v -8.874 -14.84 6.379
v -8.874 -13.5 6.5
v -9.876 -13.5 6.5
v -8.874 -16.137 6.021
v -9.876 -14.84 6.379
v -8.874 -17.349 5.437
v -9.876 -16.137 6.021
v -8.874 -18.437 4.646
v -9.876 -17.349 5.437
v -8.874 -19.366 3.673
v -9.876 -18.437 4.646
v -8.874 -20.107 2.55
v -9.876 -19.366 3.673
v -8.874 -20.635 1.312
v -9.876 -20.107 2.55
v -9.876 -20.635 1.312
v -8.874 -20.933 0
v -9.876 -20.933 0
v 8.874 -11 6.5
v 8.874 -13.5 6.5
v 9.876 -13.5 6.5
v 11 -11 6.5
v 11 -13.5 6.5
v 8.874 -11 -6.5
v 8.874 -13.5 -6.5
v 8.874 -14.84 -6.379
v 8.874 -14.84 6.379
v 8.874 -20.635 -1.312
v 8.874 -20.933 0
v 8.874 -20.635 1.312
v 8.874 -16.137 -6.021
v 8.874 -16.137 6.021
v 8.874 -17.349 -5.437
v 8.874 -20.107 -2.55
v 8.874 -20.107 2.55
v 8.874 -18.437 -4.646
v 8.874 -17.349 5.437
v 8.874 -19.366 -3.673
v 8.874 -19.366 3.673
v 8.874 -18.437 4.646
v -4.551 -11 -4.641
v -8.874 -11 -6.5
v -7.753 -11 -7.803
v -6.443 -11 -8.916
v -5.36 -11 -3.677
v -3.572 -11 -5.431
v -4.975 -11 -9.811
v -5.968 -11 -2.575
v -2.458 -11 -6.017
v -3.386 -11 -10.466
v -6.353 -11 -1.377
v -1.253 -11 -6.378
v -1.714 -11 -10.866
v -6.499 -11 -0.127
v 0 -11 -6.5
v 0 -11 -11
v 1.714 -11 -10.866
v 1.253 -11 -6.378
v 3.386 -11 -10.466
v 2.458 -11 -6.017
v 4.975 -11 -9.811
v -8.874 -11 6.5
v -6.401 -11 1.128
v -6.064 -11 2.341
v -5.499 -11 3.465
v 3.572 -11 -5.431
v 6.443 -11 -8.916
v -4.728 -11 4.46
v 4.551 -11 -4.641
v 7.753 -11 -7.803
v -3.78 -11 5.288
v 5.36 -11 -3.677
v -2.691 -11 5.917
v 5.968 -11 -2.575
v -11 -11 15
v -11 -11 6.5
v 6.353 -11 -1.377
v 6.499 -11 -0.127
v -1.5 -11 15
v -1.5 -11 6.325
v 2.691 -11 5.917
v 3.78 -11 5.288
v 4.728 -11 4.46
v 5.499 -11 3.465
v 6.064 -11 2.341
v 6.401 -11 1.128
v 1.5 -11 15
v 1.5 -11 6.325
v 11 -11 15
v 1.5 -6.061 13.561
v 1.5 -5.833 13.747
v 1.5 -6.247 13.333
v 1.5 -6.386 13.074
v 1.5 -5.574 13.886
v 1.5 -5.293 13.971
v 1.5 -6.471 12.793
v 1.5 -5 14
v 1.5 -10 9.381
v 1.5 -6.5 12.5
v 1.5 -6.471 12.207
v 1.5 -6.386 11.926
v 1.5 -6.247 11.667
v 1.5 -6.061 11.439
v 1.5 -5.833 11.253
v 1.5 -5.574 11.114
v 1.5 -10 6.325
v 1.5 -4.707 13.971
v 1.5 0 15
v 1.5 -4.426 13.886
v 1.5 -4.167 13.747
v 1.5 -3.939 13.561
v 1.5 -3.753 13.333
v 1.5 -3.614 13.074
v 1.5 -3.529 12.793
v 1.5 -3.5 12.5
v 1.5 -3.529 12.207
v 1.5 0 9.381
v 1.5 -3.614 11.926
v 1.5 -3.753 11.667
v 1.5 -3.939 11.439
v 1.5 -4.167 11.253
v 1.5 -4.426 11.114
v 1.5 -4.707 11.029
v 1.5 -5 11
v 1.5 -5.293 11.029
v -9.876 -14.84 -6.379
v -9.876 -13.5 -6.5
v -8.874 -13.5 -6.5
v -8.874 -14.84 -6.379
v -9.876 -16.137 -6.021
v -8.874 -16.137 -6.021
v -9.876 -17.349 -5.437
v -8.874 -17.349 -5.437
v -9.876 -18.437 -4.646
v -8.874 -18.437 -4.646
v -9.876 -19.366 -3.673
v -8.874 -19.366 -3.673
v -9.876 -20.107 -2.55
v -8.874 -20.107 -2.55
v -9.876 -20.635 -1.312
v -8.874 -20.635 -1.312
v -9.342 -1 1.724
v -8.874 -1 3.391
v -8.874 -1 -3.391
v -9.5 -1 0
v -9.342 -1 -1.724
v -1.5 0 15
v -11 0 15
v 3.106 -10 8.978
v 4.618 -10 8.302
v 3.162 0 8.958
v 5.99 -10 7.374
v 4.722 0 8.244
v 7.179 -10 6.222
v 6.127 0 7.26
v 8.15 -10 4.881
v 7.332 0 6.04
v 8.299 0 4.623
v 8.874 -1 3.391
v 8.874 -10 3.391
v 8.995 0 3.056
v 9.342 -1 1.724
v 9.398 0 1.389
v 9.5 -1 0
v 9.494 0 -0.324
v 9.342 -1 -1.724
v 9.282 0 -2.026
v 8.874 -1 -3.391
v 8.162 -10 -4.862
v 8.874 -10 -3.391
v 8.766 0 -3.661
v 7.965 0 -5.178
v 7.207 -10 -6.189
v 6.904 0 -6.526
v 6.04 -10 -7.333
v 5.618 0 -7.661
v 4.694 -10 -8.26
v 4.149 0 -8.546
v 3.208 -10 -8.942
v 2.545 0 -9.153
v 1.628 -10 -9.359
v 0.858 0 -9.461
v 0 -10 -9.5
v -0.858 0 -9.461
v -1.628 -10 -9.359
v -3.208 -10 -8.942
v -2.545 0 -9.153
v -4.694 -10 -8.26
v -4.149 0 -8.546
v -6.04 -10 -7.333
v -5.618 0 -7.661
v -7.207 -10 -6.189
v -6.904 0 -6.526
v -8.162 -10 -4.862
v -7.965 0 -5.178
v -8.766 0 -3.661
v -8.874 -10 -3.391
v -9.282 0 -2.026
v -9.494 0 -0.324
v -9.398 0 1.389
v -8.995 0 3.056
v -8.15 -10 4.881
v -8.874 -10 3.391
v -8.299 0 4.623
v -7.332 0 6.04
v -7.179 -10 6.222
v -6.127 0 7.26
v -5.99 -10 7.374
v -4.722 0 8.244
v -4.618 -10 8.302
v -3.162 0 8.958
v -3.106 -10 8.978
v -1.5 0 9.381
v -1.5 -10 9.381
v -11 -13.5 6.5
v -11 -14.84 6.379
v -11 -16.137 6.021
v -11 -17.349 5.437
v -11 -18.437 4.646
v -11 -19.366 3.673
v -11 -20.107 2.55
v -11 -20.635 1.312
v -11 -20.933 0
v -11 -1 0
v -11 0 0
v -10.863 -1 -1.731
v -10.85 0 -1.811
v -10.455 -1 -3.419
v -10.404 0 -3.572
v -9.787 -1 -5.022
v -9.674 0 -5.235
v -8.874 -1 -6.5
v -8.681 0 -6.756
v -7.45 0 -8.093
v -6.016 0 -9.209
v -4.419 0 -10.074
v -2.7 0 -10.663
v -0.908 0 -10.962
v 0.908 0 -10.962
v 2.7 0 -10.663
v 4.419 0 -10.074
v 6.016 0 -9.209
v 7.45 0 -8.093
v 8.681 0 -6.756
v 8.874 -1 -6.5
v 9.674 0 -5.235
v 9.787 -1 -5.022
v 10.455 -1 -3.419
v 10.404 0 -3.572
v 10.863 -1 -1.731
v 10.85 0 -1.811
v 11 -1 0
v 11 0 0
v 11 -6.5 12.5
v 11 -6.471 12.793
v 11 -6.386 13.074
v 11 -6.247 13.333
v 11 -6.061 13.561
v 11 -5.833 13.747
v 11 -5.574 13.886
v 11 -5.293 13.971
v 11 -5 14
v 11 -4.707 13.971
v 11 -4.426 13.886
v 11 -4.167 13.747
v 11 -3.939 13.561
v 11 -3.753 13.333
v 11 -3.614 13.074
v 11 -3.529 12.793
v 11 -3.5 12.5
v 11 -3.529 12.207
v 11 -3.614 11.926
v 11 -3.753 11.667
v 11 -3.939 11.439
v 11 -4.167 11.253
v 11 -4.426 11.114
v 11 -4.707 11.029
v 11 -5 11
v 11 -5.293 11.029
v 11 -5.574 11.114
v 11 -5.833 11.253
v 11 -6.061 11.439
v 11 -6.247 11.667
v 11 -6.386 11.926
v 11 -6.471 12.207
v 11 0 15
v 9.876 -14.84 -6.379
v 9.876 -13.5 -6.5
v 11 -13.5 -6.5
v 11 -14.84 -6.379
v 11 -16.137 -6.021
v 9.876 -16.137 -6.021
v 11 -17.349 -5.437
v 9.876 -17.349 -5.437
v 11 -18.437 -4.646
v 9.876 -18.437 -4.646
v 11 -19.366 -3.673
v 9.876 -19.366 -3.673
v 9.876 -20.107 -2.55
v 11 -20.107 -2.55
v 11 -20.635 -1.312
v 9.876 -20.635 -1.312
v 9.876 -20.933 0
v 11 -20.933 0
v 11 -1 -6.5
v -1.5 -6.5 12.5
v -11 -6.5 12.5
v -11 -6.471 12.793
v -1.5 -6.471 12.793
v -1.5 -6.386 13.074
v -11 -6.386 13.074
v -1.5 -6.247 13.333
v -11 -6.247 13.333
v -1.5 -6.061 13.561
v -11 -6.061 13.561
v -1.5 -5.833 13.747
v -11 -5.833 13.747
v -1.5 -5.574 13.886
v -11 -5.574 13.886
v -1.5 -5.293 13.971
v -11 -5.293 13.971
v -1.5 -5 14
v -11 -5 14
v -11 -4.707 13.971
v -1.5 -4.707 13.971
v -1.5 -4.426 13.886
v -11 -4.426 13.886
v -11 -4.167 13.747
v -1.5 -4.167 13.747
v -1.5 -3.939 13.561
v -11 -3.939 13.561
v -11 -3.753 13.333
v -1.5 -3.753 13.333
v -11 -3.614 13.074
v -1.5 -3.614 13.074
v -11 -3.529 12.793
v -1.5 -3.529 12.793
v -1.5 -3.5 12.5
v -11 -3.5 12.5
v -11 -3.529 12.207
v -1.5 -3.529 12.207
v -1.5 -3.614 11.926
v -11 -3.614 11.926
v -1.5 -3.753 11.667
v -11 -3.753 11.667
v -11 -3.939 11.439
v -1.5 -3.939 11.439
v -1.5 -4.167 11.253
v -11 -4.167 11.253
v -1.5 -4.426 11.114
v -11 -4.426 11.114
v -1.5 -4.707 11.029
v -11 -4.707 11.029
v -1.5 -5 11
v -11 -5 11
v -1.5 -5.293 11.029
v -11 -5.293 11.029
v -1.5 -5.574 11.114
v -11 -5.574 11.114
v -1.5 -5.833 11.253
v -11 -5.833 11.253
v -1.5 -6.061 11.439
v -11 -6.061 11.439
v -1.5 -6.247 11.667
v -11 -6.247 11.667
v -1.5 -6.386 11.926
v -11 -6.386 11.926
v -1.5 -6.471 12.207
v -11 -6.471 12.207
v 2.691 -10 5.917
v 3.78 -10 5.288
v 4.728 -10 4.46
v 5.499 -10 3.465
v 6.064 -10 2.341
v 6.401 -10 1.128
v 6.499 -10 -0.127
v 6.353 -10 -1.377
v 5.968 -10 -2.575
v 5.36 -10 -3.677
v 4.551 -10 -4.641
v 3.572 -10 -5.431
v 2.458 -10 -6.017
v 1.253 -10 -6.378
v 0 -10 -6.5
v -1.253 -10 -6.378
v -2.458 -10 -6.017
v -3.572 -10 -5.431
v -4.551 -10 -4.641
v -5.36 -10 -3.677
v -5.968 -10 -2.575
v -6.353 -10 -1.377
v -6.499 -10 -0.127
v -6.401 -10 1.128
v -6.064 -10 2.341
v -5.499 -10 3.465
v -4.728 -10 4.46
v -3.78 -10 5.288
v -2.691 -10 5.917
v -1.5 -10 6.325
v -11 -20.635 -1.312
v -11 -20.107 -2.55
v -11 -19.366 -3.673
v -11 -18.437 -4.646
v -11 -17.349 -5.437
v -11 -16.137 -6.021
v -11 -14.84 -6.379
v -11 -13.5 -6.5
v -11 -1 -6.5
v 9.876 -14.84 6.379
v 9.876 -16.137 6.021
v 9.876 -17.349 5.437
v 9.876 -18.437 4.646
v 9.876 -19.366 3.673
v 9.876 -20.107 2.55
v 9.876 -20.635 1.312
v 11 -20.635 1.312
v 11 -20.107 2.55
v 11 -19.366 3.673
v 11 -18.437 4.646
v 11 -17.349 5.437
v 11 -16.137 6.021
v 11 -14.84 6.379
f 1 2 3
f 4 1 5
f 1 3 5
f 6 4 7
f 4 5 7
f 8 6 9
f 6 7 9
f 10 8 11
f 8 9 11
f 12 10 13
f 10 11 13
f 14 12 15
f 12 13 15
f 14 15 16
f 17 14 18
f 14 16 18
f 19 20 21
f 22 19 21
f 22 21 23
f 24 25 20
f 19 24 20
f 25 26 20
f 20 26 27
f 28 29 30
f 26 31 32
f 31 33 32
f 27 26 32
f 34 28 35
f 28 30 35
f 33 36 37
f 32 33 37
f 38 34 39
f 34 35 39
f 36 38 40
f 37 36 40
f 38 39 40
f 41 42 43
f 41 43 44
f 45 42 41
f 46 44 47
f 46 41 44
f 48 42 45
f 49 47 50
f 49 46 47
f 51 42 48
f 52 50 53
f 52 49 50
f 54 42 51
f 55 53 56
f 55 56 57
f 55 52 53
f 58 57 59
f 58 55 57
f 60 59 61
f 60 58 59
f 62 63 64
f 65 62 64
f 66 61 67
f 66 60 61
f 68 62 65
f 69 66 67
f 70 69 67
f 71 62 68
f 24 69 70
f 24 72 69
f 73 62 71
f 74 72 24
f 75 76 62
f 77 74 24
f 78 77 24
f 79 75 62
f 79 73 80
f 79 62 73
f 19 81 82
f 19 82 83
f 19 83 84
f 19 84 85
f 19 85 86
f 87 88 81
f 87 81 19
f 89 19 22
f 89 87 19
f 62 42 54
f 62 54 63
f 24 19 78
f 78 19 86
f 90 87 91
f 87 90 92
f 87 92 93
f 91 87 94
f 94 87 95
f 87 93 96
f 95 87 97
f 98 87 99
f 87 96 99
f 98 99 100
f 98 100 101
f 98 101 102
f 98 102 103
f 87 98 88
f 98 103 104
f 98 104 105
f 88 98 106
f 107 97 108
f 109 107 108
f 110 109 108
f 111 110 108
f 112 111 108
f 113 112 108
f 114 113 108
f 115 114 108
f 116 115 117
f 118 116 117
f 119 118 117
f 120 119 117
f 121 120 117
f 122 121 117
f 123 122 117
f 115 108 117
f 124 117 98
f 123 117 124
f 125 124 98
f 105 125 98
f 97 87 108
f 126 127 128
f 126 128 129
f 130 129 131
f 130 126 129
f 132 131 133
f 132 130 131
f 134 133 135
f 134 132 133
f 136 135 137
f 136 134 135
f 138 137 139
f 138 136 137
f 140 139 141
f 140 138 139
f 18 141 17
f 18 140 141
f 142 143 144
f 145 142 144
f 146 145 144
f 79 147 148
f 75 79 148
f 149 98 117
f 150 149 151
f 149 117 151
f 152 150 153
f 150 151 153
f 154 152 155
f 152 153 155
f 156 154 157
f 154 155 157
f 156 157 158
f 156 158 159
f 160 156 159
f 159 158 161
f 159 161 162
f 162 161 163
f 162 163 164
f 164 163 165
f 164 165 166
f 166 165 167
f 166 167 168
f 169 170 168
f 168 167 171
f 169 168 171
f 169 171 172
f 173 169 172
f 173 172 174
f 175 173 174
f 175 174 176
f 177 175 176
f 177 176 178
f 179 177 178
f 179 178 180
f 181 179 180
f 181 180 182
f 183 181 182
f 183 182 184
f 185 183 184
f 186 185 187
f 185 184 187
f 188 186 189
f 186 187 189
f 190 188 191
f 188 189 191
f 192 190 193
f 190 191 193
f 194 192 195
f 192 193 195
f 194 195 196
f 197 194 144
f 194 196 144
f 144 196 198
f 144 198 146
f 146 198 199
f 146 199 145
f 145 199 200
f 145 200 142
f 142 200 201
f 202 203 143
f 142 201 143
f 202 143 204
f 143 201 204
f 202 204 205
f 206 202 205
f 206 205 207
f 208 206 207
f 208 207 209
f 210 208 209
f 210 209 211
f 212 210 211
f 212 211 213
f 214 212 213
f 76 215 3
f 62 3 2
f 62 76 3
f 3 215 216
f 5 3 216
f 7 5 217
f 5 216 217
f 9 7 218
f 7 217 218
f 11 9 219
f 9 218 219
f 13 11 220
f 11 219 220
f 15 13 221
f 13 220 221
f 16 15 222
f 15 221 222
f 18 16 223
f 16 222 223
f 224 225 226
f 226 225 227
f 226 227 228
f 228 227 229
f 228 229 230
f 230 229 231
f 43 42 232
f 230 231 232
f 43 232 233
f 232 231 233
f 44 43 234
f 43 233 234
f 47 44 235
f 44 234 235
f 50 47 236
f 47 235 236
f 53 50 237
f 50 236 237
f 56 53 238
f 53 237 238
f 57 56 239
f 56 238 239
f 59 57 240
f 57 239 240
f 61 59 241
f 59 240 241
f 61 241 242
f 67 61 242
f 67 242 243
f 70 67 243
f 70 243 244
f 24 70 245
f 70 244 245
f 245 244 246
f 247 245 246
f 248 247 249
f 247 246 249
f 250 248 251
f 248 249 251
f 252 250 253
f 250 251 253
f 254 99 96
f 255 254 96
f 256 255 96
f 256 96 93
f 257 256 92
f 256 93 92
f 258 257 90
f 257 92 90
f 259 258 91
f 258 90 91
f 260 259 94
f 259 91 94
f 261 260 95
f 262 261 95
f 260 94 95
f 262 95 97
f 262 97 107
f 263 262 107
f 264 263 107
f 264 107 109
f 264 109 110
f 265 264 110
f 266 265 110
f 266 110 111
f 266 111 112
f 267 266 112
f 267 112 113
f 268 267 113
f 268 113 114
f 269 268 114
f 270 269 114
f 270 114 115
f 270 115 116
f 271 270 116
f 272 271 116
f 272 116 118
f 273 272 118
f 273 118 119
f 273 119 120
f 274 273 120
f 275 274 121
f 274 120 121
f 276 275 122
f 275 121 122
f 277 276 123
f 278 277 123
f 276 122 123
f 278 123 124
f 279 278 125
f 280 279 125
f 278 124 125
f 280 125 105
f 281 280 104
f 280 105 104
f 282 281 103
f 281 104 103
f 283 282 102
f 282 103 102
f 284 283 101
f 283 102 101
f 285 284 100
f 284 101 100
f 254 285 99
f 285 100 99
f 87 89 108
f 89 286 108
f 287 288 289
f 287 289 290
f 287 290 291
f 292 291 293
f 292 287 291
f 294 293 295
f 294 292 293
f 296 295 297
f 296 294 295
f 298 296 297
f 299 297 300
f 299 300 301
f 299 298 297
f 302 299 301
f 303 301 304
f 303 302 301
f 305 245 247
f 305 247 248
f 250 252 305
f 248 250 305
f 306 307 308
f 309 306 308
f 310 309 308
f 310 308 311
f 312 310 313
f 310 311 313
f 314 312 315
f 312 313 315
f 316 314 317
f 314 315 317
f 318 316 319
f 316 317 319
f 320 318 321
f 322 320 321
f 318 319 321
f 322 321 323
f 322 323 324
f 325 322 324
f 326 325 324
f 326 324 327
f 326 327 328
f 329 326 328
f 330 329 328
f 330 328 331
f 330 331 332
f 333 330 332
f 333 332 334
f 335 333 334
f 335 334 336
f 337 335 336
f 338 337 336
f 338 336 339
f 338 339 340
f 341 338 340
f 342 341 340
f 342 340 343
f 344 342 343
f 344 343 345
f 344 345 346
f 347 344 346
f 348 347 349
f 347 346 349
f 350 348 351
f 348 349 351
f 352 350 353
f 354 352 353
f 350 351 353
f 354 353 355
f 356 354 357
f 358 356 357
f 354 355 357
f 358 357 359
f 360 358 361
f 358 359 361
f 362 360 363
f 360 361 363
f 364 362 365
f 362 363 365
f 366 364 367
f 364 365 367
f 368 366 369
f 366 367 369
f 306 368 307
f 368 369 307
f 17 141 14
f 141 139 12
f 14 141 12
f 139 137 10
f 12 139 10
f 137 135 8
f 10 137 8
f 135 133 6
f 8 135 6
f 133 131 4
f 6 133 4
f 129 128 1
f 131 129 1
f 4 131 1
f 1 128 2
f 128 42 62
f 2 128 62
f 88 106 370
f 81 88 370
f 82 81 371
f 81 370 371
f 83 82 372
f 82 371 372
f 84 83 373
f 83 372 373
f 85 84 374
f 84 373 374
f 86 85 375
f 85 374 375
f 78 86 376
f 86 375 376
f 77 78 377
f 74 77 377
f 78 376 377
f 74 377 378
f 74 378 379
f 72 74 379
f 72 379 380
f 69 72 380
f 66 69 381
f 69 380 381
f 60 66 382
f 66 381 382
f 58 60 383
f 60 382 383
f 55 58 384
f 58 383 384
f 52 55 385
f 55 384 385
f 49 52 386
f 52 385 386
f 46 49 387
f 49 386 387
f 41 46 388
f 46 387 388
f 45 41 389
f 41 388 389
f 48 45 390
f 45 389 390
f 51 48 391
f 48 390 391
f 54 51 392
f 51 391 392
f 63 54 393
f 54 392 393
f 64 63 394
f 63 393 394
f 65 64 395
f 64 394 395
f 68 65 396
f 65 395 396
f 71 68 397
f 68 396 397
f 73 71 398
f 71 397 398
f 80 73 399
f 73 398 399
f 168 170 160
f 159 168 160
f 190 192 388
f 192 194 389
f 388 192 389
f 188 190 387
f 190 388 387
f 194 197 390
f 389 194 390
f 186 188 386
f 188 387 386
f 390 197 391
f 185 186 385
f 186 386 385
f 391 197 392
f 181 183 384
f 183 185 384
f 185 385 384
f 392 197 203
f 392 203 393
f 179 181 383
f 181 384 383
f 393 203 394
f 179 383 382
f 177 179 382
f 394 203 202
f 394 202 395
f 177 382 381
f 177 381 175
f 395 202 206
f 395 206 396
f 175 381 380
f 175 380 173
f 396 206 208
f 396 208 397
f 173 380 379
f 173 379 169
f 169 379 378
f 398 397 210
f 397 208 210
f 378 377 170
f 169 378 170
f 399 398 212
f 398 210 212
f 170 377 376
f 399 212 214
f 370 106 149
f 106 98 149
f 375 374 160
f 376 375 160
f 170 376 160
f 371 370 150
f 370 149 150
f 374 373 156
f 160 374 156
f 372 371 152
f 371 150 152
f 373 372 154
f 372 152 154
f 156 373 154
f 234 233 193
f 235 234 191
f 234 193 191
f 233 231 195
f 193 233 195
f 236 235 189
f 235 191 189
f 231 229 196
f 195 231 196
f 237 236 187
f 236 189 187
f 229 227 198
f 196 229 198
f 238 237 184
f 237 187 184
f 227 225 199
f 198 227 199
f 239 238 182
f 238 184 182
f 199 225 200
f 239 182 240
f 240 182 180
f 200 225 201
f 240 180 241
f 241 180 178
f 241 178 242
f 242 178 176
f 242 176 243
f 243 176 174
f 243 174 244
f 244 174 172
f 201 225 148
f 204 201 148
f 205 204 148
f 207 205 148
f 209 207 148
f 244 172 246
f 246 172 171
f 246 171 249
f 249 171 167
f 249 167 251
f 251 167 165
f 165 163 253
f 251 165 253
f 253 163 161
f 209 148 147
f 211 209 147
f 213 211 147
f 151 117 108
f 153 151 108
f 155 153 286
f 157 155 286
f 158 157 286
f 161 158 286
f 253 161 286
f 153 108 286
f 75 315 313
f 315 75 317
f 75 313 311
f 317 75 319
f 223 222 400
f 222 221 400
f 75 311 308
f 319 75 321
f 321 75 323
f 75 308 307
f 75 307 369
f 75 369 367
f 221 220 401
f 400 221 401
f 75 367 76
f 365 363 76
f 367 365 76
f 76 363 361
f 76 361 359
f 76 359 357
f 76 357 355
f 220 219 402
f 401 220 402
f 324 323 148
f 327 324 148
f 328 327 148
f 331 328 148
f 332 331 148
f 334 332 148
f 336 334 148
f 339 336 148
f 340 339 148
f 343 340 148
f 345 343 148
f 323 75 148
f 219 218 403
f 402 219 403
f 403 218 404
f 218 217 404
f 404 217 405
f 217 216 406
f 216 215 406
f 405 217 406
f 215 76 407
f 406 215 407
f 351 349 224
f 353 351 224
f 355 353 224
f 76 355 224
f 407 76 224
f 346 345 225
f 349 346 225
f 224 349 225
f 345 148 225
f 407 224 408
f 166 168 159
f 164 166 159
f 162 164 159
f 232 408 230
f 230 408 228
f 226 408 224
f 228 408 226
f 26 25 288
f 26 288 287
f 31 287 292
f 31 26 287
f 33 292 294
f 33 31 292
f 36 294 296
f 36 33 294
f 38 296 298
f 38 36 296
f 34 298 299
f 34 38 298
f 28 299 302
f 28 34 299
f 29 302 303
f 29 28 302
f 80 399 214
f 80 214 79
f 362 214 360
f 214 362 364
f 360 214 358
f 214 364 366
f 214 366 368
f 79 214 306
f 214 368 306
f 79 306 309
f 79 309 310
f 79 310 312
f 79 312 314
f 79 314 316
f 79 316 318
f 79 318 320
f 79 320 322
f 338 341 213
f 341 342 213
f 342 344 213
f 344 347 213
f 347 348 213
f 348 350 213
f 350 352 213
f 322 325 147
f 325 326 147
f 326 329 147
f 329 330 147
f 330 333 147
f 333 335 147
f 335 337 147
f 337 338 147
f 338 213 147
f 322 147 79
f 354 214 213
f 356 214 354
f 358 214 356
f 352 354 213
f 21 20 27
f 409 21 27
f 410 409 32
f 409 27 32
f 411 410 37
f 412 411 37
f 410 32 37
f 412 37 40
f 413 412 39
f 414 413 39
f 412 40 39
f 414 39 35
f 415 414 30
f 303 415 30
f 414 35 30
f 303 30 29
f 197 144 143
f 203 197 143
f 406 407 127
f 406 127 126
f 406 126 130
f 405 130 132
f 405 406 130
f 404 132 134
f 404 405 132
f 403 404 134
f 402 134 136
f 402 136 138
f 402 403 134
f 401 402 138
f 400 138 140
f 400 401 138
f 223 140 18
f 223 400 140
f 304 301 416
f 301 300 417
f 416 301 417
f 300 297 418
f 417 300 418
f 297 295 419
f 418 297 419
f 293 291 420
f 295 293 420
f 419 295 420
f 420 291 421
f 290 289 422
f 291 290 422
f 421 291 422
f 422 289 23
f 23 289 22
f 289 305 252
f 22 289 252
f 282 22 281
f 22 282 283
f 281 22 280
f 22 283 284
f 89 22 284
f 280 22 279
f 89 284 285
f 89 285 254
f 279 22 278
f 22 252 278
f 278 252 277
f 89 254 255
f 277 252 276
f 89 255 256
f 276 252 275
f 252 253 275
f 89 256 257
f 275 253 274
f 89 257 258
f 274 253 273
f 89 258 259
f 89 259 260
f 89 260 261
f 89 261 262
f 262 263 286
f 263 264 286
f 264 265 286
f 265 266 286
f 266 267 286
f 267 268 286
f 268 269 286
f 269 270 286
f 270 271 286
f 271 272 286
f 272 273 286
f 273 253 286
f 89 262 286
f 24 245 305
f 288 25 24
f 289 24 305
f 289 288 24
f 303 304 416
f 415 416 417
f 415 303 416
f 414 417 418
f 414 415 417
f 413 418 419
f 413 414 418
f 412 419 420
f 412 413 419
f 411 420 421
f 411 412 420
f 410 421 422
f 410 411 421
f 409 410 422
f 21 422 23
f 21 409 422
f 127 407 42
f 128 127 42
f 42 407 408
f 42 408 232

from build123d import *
from build123d import SkipClean  # not in build123d's __all__

# Parameters (mm, degrees)
F1_DEPTH    = 10
F3_D        = 3
F5_DEPTH    = 1
F6_W        = 2.1258803254
F6_H        = 13
F7_DEPTH    = 10
F8_T1_DEPTH = 39.6258803254
F8_T3_DEPTH = 39.6258803254


# Not quite as in the source:
# - a fillet or chamfer that OpenCascade refuses, or shapes differently, is made with other operations: its cross-section is extruded or revolved along the edge and cut away or added


with BuildPart() as f1:
    # F0 (on Front) → F1 (new body)
    with BuildSketch(Plane.XZ):
        with BuildLine():
            ThreePointArc((1.5, 9.3808315196), (0, -9.5), (-1.5, 9.3808315196))
            Line((-1.5, 9.3808315196), (-1.5, 15))
            Line((-1.5, 15), (-11, 15))
            Line((-11, 15), (-11, 0))
            ThreePointArc((-11, 0), (0, -11), (11, 0))
            Line((11, 0), (11, 15))
            Line((11, 15), (1.5, 15))
            Line((1.5, 15), (1.5, 9.3808315196))
        make_face()
    extrude(amount=F1_DEPTH)

    # F3 (through all)
    with Locations(Plane.YZ.offset(11)):
        with Locations((-5, 12.5)):
            Hole(F3_D / 2)

    # F4 (on face) → F5 (join)
    with BuildSketch(Plane.XZ.offset(10)):
        with BuildLine():
            Line((-1.5, 15), (-11, 15))
            Line((-11, 15), (-11, 0))
            ThreePointArc((-11, 0), (0, -11), (11, 0))
            Line((11, 0), (11, 15))
            Line((11, 15), (1.5, 15))
            Line((1.5, 15), (1.5, 6.3245553203))
            ThreePointArc((1.5, 6.3245553203), (0, -6.5), (-1.5, 6.3245553203))
            Line((-1.5, 6.3245553203), (-1.5, 15))
        make_face()
    extrude(amount=F5_DEPTH)

    # F6 (on face) → F7 (join, symmetric)
    with BuildSketch(Plane.XZ.offset(11)):
        with Locations((-9.9370598373, 0)):
            Rectangle(F6_W, F6_H)
        with Locations((9.9370598373, 0)):
            Rectangle(F6_W, F6_H)
    extrude(amount=F7_DEPTH, both=True)

    # F8: fillet of radius 7.5 on 4 edges, made by hand

    # F8_s2 → F8_t1 (cut)
    with BuildSketch(Plane.YZ.offset(-29.75)):
        with BuildLine():
            ThreePointArc((-13.5, -6.5), (-18.8033008589, -4.3033008589), (-21, 1))
            Line((-21, 1), (-21, -6.5))
            Line((-21, -6.5), (-13.5, -6.5))
        make_face()
        with BuildLine():
            ThreePointArc((-13.5, 6.5), (-18.8033008589, 4.3033008589), (-21, -1))
            Line((-21, -1), (-21, 6.5))
            Line((-21, 6.5), (-13.5, 6.5))
        make_face()
    extrude(amount=F8_T1_DEPTH, mode=Mode.SUBTRACT)

    # F8_s4 → F8_t3 (cut)
    with BuildSketch(Plane.YZ.offset(-9.8758803254)):
        with BuildLine():
            ThreePointArc((-21, -1), (-18.8033008589, 4.3033008589), (-13.5, 6.5))
            Line((-13.5, 6.5), (-21, 6.5))
            Line((-21, 6.5), (-21, -1))
        make_face()
        with BuildLine():
            ThreePointArc((-13.5, -6.5), (-18.8033008589, -4.3033008589), (-21, 1))
            Line((-21, 1), (-21, -6.5))
            Line((-21, -6.5), (-13.5, -6.5))
        make_face()
    with SkipClean():  # cleaning this boolean's faces spoils the solid; the shape is the same uncleaned
        extrude(amount=F8_T3_DEPTH, mode=Mode.SUBTRACT)


solid = f1.part
